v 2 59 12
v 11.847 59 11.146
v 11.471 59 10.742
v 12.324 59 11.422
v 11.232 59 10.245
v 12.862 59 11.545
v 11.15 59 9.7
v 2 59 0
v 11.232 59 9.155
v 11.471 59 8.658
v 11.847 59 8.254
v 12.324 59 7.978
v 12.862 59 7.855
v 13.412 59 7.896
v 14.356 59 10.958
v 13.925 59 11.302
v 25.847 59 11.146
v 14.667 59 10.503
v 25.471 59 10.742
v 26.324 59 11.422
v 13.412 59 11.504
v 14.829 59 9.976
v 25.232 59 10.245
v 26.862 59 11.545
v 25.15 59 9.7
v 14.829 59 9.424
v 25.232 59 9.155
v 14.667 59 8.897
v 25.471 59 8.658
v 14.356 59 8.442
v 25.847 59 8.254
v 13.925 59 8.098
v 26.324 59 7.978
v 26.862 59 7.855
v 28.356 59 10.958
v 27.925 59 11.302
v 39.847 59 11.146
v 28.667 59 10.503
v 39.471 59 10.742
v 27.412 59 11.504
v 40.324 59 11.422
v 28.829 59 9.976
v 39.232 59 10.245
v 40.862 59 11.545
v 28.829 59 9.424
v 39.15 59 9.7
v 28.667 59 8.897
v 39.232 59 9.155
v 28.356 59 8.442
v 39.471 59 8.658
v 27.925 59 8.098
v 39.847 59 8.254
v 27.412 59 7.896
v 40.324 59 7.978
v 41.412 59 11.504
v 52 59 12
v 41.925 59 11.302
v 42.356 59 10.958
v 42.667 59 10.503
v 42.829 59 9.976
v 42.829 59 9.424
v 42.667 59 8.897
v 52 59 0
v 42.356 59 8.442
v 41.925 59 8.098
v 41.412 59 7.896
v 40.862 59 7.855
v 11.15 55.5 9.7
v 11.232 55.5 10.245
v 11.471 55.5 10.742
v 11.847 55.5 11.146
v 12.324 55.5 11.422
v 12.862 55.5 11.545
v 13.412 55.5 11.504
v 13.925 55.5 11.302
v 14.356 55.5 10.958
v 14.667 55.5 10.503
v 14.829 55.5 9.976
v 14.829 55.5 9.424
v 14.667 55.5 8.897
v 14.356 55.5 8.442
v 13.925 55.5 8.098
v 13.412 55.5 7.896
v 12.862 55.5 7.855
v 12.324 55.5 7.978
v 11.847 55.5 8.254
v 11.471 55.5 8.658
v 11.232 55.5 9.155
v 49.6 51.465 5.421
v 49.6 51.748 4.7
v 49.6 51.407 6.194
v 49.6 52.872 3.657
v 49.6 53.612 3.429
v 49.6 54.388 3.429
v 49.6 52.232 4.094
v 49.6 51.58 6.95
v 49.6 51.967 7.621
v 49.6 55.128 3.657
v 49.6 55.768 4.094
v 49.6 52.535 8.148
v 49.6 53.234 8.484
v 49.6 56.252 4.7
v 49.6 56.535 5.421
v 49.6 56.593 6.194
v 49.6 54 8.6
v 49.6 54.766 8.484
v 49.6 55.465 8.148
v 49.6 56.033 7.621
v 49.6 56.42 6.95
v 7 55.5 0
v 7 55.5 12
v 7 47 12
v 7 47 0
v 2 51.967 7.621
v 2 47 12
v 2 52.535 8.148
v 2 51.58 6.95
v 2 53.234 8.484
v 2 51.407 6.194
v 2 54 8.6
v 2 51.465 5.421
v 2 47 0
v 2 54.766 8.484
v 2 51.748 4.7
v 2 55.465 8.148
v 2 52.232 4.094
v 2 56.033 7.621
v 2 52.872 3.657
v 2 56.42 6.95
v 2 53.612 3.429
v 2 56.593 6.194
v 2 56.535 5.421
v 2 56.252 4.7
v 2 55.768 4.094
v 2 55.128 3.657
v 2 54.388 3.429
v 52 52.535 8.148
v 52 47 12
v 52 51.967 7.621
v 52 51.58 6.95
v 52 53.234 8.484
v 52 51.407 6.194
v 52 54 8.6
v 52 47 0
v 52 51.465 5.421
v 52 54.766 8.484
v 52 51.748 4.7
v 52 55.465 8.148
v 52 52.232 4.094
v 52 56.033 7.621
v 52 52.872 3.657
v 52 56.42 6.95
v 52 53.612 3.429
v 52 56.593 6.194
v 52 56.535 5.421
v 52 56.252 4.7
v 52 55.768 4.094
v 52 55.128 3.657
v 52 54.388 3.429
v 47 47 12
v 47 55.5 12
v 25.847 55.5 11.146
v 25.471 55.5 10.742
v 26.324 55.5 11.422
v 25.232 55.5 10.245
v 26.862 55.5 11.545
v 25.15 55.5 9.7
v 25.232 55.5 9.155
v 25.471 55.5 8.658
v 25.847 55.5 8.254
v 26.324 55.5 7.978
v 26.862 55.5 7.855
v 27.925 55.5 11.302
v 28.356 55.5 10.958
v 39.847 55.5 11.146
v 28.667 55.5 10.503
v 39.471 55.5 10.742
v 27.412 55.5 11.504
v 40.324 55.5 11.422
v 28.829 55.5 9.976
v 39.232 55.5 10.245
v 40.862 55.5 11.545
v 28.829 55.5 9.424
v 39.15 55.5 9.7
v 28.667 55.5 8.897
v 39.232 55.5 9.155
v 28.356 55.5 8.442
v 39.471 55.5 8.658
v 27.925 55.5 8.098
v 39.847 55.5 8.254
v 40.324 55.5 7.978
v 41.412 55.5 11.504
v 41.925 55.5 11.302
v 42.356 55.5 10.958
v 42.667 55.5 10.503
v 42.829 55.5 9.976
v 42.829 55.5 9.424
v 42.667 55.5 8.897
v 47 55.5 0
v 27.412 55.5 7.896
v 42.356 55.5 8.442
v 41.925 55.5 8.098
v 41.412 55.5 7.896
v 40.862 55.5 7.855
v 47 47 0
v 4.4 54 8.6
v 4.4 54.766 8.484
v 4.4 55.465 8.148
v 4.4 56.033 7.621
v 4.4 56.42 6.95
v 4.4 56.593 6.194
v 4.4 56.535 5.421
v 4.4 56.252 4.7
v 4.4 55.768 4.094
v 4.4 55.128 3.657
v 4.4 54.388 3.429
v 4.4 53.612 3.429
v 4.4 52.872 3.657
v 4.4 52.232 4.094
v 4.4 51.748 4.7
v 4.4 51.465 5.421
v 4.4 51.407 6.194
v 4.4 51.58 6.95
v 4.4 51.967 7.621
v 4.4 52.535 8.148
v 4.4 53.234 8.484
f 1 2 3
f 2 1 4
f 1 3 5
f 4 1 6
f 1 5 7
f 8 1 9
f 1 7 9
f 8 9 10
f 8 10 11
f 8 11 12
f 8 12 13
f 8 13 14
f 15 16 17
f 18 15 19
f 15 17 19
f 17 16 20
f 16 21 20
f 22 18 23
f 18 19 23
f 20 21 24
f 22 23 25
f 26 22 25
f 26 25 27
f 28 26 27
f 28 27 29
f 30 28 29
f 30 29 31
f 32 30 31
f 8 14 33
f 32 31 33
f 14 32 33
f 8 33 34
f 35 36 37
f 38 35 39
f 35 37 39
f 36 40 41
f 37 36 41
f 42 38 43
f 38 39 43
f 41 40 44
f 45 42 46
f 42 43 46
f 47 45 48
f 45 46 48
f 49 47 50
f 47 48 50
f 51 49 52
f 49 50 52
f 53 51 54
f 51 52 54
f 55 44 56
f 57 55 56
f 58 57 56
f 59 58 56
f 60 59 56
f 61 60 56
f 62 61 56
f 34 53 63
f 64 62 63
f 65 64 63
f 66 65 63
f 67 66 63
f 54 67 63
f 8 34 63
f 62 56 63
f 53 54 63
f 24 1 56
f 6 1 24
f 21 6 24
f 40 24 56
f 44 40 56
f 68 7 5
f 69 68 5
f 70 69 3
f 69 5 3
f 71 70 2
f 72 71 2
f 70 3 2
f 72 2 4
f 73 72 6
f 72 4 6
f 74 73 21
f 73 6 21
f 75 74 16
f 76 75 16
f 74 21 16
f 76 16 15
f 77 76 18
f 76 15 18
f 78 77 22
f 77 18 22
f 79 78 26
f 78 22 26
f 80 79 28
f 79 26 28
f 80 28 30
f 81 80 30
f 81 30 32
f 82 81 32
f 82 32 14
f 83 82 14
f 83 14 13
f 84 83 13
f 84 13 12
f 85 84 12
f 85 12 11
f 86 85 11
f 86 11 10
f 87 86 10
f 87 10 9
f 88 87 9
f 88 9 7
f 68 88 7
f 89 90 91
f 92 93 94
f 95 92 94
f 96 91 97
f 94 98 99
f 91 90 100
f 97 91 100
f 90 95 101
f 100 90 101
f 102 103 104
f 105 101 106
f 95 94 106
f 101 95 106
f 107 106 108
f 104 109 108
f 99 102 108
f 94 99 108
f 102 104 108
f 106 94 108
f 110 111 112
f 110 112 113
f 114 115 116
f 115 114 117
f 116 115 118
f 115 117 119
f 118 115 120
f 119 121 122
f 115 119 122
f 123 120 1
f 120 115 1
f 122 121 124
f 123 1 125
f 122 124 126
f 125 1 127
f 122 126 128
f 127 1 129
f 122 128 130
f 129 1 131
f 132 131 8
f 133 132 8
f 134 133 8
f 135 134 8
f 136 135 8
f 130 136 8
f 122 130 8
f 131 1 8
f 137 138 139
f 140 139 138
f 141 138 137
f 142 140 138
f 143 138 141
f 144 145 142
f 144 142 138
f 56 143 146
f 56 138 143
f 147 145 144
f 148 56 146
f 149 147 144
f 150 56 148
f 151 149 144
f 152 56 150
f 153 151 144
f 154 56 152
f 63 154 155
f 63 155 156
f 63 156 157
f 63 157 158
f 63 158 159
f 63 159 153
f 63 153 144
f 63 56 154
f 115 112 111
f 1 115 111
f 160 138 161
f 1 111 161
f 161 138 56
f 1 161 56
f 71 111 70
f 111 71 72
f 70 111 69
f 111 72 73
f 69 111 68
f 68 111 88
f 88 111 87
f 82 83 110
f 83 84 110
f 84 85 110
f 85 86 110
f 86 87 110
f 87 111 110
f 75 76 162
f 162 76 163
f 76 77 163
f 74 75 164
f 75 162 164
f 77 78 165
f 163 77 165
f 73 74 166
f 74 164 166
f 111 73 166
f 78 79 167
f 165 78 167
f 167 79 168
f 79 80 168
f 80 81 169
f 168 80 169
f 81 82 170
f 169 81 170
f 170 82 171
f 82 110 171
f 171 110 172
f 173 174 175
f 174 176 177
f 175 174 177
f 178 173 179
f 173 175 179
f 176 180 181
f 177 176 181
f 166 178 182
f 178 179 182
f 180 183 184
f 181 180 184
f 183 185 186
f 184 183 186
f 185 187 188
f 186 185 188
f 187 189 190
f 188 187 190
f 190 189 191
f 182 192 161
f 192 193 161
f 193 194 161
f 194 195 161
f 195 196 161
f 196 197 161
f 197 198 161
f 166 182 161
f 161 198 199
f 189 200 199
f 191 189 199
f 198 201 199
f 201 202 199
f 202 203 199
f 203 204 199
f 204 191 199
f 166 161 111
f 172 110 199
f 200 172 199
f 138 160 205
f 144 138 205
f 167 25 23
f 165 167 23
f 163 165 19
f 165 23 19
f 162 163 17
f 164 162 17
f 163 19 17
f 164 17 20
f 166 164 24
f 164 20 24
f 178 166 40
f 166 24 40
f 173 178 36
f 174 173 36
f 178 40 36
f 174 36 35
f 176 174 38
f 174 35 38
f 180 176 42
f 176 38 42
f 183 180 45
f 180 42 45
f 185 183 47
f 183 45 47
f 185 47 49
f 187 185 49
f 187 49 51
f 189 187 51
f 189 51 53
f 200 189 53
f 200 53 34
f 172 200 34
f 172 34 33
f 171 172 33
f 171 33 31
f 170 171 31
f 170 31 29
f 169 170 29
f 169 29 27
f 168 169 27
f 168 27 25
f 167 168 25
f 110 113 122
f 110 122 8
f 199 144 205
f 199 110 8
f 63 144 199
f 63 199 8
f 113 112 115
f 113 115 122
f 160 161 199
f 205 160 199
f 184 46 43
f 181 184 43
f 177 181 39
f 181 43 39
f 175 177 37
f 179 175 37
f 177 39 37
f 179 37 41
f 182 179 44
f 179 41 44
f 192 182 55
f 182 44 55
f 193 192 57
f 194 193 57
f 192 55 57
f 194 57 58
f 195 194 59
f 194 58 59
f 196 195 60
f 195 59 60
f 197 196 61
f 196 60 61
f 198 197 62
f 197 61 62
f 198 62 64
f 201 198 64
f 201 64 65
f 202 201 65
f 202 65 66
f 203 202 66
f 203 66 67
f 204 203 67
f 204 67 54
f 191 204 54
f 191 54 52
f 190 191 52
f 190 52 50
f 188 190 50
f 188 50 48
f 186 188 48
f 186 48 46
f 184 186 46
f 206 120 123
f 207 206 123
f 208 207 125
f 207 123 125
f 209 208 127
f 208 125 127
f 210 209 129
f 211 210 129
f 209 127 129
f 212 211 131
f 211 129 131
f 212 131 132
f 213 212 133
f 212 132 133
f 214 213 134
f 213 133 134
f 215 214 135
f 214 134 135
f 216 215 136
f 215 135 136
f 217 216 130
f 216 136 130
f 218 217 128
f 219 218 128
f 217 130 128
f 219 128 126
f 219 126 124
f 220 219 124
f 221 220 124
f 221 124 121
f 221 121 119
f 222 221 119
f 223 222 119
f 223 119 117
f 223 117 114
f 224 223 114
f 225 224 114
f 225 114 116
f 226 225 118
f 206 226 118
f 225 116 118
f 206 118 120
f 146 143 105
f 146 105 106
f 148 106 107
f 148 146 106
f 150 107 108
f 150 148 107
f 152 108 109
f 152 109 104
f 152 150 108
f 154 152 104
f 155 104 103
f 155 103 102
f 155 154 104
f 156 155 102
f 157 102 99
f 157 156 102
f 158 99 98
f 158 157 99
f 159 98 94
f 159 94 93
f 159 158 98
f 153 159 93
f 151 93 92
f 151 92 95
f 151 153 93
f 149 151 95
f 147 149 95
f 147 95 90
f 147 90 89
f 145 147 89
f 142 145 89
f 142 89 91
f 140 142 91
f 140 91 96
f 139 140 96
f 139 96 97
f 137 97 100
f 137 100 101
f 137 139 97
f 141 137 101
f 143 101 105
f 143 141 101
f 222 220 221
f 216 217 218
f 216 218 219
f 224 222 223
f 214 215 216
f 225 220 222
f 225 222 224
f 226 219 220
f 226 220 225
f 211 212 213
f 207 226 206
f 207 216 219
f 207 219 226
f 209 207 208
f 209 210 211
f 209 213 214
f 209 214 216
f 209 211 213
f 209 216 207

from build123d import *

# Parameters (mm, degrees)
SKETCH1_W           = 54
SKETCH1_H           = 59
SKETCH1_W_2         = 40
SKETCH1_H_2         = 52
BOSS_EXTRUDE1_DEPTH = 12
SKETCH2_R           = 1.85
CUT_EXTRUDE1_DEPTH  = 10
SKETCH3_R           = 1.85
CUT_EXTRUDE2_DEPTH  = 10
SKETCH4_W           = 54
SKETCH4_H           = 12
CUT_EXTRUDE4_DEPTH  = 40
SKETCH5_W           = 7
SKETCH5_H           = 12
CUT_EXTRUDE5_DEPTH  = 40
SKETCH6_W           = 12
SKETCH6_H           = 12
BOSS_EXTRUDE2_DEPTH = 5
SKETCH7_R           = 2.6
CUT_EXTRUDE6_DEPTH  = 2.4


with BuildPart() as part:
    # Sketch1 → Boss-Extrude1 (new body)
    with BuildSketch(Plane.XY):
        with Locations((27, 29.5)):
            Rectangle(SKETCH1_W, SKETCH1_H)
        with Locations((27, 29.5)):
            Rectangle(SKETCH1_W_2, SKETCH1_H_2, mode=Mode.SUBTRACT)
    extrude(amount=BOSS_EXTRUDE1_DEPTH)

    # Sketch2 → Cut-Extrude1 (cut)
    with BuildSketch(Plane(origin=(0, 59, 0), x_dir=(1, 0, 0), z_dir=(0, 1, 0))):
        with Locations(Location((13, -9.7, 0), (0, 0, 180))):
            Circle(SKETCH2_R)
        with Locations(Location((41, -9.7, 0), (0, 0, 180))):
            Circle(SKETCH2_R)
        with Locations(Location((27, -9.7, 0), (0, 0, 180))):
            Circle(SKETCH2_R)
    extrude(amount=-CUT_EXTRUDE1_DEPTH, mode=Mode.SUBTRACT)

    # Sketch3 → Cut-Extrude2 (cut)
    with BuildSketch(Plane.XZ):
        with Locations(Location((12.75, 6, 0), (0, 0, 270))):
            Circle(SKETCH3_R)
        with Locations(Location((41.25, 6, 0), (0, 0, 90))):
            Circle(SKETCH3_R)
    extrude(amount=-CUT_EXTRUDE2_DEPTH, mode=Mode.SUBTRACT)

    # Sketch4 → Cut-Extrude4 (cut)
    with BuildSketch(Plane.XZ):
        with Locations((27, 6)):
            Rectangle(SKETCH4_W, SKETCH4_H)
    extrude(amount=-CUT_EXTRUDE4_DEPTH, mode=Mode.SUBTRACT)

    # Sketch5 → Cut-Extrude5 (cut)
    with BuildSketch(Plane.XZ.offset(-40)):
        with Locations((3.5, 6)):
            Rectangle(SKETCH5_W, SKETCH5_H)
        with Locations((50.5, 6)):
            Rectangle(SKETCH5_W, SKETCH5_H)
    extrude(amount=-CUT_EXTRUDE5_DEPTH, mode=Mode.SUBTRACT)

    # Sketch6 → Boss-Extrude2 (add)
    with BuildSketch(Plane(origin=(47, 0, 0), x_dir=(0, 0, -1), z_dir=(1, 0, 0))):
        with Locations((-6, 53)):
            Rectangle(SKETCH6_W, SKETCH6_H)
    boss_extrude2 = extrude(amount=BOSS_EXTRUDE2_DEPTH)

    # Mirror1: Boss-Extrude2 across plane
    add(boss_extrude2.mirror(Plane.ZY.offset(-27)))

    # Sketch7 → Cut-Extrude6 (cut)
    with BuildSketch(Plane.ZY.offset(-2)):
        with Locations((6, 54)):
            Circle(SKETCH7_R)
    cut_extrude6 = extrude(amount=-CUT_EXTRUDE6_DEPTH, mode=Mode.SUBTRACT)

    # Mirror2: Cut-Extrude6 across plane
    add(cut_extrude6.mirror(Plane.ZY.offset(-27)), mode=Mode.SUBTRACT)


solid = part.part
